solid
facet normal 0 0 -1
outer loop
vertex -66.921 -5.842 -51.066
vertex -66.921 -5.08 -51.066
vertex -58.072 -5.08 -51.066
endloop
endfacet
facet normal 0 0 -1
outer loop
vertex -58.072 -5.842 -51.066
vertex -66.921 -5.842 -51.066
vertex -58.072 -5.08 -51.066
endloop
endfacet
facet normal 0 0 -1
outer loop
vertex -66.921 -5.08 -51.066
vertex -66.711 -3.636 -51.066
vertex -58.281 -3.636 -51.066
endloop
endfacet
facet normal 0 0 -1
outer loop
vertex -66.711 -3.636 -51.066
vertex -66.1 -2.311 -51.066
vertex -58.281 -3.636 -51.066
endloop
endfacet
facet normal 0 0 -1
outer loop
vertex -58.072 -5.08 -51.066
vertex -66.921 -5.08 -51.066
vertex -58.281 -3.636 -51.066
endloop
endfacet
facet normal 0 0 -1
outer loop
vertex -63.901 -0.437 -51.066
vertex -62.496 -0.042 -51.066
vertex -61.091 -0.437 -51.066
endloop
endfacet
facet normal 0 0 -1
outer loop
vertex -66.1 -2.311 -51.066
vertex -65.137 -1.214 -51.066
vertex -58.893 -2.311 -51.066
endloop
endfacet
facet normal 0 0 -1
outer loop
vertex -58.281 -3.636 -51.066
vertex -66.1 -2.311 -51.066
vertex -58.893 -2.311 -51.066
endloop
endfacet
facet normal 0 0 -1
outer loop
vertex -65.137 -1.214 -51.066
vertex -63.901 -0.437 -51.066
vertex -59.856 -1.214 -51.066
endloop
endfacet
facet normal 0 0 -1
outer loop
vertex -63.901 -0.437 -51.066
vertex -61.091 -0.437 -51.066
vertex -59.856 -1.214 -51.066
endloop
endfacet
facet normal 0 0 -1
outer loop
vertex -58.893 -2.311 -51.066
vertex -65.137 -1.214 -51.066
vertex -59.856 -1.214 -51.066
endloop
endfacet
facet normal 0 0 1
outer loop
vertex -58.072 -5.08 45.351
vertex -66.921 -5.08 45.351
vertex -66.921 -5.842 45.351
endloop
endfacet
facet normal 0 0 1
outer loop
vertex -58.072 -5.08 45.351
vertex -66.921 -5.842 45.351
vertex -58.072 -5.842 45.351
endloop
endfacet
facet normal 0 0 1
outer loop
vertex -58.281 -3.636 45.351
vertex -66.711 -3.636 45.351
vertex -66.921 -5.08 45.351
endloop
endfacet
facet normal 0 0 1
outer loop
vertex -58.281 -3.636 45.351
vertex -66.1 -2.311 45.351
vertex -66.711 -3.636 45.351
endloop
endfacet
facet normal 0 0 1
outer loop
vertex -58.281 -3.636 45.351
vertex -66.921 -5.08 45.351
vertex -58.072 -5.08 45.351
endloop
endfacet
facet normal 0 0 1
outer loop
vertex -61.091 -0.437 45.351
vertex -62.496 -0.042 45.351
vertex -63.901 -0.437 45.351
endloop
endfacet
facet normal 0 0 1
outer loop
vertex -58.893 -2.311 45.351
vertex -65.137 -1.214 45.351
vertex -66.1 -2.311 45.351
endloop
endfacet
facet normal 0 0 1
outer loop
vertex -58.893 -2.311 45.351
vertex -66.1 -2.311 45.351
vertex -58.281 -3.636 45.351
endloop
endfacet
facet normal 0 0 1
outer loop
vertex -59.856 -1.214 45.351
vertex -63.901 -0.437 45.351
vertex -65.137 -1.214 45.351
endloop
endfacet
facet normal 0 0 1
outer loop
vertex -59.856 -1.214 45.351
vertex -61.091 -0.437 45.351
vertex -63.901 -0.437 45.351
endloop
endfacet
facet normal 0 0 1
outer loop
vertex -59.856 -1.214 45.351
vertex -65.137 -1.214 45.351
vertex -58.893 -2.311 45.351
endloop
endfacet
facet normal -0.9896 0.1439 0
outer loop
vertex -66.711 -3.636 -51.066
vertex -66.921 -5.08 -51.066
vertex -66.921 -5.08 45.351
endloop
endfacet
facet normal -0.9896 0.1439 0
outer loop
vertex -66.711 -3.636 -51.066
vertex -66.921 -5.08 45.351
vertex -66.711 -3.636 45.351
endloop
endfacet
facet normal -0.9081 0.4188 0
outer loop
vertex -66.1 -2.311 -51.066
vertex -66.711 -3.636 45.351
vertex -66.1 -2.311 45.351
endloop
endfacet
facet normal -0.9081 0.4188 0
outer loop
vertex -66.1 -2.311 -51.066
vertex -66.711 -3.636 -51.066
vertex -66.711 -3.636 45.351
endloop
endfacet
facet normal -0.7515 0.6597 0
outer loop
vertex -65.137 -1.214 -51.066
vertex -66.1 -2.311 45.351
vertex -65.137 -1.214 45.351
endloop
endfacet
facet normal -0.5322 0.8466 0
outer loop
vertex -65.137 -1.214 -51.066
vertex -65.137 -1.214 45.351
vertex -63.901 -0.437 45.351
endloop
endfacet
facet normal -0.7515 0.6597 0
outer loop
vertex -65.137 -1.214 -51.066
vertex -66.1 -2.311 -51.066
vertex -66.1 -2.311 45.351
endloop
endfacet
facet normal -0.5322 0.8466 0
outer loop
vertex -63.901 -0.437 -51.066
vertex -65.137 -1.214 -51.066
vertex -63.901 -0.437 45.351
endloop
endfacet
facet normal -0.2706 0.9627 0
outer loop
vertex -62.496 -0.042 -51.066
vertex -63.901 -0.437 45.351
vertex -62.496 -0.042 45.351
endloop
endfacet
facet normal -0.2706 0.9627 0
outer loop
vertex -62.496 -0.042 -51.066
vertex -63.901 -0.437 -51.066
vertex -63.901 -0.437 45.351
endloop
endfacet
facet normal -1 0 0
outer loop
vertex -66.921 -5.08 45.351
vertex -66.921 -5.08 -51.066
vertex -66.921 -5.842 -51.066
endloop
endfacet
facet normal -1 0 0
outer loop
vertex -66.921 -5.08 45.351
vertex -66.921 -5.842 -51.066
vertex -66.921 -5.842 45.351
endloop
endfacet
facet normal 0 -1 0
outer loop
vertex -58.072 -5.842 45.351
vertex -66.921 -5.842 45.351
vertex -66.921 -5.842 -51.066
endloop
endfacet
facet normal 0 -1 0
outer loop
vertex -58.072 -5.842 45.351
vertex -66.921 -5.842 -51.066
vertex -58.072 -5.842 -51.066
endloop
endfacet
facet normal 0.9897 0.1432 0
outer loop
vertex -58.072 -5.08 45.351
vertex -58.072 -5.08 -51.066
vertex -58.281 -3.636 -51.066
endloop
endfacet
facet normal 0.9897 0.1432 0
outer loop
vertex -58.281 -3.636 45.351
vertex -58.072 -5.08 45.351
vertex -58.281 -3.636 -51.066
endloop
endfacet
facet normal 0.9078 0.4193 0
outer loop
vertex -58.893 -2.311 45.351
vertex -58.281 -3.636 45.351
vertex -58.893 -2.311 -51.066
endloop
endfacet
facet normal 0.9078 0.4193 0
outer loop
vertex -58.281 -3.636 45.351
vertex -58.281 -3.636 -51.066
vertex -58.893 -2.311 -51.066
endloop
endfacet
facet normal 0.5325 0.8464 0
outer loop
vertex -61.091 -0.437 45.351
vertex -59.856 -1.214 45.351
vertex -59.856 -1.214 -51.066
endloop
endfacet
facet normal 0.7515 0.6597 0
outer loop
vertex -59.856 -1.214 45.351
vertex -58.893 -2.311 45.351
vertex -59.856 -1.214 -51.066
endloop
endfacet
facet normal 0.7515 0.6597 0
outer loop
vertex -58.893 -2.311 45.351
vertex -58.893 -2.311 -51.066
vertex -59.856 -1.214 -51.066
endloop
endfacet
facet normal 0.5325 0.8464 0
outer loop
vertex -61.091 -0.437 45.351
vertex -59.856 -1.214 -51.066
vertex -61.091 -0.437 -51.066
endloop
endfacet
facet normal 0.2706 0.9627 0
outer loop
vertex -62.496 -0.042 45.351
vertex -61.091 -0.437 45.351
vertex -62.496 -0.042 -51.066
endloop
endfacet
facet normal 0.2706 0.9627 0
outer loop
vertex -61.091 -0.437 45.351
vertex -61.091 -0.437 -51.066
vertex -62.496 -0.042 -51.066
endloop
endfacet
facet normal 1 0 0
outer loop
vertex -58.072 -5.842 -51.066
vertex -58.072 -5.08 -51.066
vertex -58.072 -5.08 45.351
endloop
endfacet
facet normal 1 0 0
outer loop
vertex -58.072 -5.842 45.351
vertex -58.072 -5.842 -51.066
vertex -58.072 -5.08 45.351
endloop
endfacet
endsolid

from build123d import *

# Parameters (mm, degrees)
F0_W        = 8.8490359485
F0_H        = 96.4175835252
F1_DEPTH    = 5.842
F2_T1_DEPTH = 121.8175835252


# Not quite as in the source:
# - a fillet or chamfer that OpenCascade refuses, or shapes differently, is made with other operations: its cross-section is extruded or revolved along the edge and cut away or added


with BuildPart() as f1:
    # F0 (on Front) → F1 (new body)
    with BuildSketch(Plane.XZ):
        with Locations((-62.4962914735, -2.8574988246)):
            Rectangle(F0_W, F0_H)
    extrude(amount=F1_DEPTH)

    # F2: fillet of radius 5.08 on 2 edges, made by hand

    # F2_s2 → F2_t1 (cut)
    with BuildSketch(Plane.XY.offset(-63.7662905872)):
        with BuildLine():
            ThreePointArc((-58.0717734993, -5.08), (-59.5596710508, -1.4878975516), (-63.1517734993, 0))
            Line((-63.1517734993, 0), (-58.0717734993, 0))
            Line((-58.0717734993, 0), (-58.0717734993, -5.08))
        make_face()
        with BuildLine():
            ThreePointArc((-66.9208094478, -5.08), (-65.4329118962, -1.4878975516), (-61.8408094478, 0))
            Line((-61.8408094478, 0), (-66.9208094478, 0))
            Line((-66.9208094478, 0), (-66.9208094478, -5.08))
        make_face()
    extrude(amount=F2_T1_DEPTH, mode=Mode.SUBTRACT)


solid = f1.part
